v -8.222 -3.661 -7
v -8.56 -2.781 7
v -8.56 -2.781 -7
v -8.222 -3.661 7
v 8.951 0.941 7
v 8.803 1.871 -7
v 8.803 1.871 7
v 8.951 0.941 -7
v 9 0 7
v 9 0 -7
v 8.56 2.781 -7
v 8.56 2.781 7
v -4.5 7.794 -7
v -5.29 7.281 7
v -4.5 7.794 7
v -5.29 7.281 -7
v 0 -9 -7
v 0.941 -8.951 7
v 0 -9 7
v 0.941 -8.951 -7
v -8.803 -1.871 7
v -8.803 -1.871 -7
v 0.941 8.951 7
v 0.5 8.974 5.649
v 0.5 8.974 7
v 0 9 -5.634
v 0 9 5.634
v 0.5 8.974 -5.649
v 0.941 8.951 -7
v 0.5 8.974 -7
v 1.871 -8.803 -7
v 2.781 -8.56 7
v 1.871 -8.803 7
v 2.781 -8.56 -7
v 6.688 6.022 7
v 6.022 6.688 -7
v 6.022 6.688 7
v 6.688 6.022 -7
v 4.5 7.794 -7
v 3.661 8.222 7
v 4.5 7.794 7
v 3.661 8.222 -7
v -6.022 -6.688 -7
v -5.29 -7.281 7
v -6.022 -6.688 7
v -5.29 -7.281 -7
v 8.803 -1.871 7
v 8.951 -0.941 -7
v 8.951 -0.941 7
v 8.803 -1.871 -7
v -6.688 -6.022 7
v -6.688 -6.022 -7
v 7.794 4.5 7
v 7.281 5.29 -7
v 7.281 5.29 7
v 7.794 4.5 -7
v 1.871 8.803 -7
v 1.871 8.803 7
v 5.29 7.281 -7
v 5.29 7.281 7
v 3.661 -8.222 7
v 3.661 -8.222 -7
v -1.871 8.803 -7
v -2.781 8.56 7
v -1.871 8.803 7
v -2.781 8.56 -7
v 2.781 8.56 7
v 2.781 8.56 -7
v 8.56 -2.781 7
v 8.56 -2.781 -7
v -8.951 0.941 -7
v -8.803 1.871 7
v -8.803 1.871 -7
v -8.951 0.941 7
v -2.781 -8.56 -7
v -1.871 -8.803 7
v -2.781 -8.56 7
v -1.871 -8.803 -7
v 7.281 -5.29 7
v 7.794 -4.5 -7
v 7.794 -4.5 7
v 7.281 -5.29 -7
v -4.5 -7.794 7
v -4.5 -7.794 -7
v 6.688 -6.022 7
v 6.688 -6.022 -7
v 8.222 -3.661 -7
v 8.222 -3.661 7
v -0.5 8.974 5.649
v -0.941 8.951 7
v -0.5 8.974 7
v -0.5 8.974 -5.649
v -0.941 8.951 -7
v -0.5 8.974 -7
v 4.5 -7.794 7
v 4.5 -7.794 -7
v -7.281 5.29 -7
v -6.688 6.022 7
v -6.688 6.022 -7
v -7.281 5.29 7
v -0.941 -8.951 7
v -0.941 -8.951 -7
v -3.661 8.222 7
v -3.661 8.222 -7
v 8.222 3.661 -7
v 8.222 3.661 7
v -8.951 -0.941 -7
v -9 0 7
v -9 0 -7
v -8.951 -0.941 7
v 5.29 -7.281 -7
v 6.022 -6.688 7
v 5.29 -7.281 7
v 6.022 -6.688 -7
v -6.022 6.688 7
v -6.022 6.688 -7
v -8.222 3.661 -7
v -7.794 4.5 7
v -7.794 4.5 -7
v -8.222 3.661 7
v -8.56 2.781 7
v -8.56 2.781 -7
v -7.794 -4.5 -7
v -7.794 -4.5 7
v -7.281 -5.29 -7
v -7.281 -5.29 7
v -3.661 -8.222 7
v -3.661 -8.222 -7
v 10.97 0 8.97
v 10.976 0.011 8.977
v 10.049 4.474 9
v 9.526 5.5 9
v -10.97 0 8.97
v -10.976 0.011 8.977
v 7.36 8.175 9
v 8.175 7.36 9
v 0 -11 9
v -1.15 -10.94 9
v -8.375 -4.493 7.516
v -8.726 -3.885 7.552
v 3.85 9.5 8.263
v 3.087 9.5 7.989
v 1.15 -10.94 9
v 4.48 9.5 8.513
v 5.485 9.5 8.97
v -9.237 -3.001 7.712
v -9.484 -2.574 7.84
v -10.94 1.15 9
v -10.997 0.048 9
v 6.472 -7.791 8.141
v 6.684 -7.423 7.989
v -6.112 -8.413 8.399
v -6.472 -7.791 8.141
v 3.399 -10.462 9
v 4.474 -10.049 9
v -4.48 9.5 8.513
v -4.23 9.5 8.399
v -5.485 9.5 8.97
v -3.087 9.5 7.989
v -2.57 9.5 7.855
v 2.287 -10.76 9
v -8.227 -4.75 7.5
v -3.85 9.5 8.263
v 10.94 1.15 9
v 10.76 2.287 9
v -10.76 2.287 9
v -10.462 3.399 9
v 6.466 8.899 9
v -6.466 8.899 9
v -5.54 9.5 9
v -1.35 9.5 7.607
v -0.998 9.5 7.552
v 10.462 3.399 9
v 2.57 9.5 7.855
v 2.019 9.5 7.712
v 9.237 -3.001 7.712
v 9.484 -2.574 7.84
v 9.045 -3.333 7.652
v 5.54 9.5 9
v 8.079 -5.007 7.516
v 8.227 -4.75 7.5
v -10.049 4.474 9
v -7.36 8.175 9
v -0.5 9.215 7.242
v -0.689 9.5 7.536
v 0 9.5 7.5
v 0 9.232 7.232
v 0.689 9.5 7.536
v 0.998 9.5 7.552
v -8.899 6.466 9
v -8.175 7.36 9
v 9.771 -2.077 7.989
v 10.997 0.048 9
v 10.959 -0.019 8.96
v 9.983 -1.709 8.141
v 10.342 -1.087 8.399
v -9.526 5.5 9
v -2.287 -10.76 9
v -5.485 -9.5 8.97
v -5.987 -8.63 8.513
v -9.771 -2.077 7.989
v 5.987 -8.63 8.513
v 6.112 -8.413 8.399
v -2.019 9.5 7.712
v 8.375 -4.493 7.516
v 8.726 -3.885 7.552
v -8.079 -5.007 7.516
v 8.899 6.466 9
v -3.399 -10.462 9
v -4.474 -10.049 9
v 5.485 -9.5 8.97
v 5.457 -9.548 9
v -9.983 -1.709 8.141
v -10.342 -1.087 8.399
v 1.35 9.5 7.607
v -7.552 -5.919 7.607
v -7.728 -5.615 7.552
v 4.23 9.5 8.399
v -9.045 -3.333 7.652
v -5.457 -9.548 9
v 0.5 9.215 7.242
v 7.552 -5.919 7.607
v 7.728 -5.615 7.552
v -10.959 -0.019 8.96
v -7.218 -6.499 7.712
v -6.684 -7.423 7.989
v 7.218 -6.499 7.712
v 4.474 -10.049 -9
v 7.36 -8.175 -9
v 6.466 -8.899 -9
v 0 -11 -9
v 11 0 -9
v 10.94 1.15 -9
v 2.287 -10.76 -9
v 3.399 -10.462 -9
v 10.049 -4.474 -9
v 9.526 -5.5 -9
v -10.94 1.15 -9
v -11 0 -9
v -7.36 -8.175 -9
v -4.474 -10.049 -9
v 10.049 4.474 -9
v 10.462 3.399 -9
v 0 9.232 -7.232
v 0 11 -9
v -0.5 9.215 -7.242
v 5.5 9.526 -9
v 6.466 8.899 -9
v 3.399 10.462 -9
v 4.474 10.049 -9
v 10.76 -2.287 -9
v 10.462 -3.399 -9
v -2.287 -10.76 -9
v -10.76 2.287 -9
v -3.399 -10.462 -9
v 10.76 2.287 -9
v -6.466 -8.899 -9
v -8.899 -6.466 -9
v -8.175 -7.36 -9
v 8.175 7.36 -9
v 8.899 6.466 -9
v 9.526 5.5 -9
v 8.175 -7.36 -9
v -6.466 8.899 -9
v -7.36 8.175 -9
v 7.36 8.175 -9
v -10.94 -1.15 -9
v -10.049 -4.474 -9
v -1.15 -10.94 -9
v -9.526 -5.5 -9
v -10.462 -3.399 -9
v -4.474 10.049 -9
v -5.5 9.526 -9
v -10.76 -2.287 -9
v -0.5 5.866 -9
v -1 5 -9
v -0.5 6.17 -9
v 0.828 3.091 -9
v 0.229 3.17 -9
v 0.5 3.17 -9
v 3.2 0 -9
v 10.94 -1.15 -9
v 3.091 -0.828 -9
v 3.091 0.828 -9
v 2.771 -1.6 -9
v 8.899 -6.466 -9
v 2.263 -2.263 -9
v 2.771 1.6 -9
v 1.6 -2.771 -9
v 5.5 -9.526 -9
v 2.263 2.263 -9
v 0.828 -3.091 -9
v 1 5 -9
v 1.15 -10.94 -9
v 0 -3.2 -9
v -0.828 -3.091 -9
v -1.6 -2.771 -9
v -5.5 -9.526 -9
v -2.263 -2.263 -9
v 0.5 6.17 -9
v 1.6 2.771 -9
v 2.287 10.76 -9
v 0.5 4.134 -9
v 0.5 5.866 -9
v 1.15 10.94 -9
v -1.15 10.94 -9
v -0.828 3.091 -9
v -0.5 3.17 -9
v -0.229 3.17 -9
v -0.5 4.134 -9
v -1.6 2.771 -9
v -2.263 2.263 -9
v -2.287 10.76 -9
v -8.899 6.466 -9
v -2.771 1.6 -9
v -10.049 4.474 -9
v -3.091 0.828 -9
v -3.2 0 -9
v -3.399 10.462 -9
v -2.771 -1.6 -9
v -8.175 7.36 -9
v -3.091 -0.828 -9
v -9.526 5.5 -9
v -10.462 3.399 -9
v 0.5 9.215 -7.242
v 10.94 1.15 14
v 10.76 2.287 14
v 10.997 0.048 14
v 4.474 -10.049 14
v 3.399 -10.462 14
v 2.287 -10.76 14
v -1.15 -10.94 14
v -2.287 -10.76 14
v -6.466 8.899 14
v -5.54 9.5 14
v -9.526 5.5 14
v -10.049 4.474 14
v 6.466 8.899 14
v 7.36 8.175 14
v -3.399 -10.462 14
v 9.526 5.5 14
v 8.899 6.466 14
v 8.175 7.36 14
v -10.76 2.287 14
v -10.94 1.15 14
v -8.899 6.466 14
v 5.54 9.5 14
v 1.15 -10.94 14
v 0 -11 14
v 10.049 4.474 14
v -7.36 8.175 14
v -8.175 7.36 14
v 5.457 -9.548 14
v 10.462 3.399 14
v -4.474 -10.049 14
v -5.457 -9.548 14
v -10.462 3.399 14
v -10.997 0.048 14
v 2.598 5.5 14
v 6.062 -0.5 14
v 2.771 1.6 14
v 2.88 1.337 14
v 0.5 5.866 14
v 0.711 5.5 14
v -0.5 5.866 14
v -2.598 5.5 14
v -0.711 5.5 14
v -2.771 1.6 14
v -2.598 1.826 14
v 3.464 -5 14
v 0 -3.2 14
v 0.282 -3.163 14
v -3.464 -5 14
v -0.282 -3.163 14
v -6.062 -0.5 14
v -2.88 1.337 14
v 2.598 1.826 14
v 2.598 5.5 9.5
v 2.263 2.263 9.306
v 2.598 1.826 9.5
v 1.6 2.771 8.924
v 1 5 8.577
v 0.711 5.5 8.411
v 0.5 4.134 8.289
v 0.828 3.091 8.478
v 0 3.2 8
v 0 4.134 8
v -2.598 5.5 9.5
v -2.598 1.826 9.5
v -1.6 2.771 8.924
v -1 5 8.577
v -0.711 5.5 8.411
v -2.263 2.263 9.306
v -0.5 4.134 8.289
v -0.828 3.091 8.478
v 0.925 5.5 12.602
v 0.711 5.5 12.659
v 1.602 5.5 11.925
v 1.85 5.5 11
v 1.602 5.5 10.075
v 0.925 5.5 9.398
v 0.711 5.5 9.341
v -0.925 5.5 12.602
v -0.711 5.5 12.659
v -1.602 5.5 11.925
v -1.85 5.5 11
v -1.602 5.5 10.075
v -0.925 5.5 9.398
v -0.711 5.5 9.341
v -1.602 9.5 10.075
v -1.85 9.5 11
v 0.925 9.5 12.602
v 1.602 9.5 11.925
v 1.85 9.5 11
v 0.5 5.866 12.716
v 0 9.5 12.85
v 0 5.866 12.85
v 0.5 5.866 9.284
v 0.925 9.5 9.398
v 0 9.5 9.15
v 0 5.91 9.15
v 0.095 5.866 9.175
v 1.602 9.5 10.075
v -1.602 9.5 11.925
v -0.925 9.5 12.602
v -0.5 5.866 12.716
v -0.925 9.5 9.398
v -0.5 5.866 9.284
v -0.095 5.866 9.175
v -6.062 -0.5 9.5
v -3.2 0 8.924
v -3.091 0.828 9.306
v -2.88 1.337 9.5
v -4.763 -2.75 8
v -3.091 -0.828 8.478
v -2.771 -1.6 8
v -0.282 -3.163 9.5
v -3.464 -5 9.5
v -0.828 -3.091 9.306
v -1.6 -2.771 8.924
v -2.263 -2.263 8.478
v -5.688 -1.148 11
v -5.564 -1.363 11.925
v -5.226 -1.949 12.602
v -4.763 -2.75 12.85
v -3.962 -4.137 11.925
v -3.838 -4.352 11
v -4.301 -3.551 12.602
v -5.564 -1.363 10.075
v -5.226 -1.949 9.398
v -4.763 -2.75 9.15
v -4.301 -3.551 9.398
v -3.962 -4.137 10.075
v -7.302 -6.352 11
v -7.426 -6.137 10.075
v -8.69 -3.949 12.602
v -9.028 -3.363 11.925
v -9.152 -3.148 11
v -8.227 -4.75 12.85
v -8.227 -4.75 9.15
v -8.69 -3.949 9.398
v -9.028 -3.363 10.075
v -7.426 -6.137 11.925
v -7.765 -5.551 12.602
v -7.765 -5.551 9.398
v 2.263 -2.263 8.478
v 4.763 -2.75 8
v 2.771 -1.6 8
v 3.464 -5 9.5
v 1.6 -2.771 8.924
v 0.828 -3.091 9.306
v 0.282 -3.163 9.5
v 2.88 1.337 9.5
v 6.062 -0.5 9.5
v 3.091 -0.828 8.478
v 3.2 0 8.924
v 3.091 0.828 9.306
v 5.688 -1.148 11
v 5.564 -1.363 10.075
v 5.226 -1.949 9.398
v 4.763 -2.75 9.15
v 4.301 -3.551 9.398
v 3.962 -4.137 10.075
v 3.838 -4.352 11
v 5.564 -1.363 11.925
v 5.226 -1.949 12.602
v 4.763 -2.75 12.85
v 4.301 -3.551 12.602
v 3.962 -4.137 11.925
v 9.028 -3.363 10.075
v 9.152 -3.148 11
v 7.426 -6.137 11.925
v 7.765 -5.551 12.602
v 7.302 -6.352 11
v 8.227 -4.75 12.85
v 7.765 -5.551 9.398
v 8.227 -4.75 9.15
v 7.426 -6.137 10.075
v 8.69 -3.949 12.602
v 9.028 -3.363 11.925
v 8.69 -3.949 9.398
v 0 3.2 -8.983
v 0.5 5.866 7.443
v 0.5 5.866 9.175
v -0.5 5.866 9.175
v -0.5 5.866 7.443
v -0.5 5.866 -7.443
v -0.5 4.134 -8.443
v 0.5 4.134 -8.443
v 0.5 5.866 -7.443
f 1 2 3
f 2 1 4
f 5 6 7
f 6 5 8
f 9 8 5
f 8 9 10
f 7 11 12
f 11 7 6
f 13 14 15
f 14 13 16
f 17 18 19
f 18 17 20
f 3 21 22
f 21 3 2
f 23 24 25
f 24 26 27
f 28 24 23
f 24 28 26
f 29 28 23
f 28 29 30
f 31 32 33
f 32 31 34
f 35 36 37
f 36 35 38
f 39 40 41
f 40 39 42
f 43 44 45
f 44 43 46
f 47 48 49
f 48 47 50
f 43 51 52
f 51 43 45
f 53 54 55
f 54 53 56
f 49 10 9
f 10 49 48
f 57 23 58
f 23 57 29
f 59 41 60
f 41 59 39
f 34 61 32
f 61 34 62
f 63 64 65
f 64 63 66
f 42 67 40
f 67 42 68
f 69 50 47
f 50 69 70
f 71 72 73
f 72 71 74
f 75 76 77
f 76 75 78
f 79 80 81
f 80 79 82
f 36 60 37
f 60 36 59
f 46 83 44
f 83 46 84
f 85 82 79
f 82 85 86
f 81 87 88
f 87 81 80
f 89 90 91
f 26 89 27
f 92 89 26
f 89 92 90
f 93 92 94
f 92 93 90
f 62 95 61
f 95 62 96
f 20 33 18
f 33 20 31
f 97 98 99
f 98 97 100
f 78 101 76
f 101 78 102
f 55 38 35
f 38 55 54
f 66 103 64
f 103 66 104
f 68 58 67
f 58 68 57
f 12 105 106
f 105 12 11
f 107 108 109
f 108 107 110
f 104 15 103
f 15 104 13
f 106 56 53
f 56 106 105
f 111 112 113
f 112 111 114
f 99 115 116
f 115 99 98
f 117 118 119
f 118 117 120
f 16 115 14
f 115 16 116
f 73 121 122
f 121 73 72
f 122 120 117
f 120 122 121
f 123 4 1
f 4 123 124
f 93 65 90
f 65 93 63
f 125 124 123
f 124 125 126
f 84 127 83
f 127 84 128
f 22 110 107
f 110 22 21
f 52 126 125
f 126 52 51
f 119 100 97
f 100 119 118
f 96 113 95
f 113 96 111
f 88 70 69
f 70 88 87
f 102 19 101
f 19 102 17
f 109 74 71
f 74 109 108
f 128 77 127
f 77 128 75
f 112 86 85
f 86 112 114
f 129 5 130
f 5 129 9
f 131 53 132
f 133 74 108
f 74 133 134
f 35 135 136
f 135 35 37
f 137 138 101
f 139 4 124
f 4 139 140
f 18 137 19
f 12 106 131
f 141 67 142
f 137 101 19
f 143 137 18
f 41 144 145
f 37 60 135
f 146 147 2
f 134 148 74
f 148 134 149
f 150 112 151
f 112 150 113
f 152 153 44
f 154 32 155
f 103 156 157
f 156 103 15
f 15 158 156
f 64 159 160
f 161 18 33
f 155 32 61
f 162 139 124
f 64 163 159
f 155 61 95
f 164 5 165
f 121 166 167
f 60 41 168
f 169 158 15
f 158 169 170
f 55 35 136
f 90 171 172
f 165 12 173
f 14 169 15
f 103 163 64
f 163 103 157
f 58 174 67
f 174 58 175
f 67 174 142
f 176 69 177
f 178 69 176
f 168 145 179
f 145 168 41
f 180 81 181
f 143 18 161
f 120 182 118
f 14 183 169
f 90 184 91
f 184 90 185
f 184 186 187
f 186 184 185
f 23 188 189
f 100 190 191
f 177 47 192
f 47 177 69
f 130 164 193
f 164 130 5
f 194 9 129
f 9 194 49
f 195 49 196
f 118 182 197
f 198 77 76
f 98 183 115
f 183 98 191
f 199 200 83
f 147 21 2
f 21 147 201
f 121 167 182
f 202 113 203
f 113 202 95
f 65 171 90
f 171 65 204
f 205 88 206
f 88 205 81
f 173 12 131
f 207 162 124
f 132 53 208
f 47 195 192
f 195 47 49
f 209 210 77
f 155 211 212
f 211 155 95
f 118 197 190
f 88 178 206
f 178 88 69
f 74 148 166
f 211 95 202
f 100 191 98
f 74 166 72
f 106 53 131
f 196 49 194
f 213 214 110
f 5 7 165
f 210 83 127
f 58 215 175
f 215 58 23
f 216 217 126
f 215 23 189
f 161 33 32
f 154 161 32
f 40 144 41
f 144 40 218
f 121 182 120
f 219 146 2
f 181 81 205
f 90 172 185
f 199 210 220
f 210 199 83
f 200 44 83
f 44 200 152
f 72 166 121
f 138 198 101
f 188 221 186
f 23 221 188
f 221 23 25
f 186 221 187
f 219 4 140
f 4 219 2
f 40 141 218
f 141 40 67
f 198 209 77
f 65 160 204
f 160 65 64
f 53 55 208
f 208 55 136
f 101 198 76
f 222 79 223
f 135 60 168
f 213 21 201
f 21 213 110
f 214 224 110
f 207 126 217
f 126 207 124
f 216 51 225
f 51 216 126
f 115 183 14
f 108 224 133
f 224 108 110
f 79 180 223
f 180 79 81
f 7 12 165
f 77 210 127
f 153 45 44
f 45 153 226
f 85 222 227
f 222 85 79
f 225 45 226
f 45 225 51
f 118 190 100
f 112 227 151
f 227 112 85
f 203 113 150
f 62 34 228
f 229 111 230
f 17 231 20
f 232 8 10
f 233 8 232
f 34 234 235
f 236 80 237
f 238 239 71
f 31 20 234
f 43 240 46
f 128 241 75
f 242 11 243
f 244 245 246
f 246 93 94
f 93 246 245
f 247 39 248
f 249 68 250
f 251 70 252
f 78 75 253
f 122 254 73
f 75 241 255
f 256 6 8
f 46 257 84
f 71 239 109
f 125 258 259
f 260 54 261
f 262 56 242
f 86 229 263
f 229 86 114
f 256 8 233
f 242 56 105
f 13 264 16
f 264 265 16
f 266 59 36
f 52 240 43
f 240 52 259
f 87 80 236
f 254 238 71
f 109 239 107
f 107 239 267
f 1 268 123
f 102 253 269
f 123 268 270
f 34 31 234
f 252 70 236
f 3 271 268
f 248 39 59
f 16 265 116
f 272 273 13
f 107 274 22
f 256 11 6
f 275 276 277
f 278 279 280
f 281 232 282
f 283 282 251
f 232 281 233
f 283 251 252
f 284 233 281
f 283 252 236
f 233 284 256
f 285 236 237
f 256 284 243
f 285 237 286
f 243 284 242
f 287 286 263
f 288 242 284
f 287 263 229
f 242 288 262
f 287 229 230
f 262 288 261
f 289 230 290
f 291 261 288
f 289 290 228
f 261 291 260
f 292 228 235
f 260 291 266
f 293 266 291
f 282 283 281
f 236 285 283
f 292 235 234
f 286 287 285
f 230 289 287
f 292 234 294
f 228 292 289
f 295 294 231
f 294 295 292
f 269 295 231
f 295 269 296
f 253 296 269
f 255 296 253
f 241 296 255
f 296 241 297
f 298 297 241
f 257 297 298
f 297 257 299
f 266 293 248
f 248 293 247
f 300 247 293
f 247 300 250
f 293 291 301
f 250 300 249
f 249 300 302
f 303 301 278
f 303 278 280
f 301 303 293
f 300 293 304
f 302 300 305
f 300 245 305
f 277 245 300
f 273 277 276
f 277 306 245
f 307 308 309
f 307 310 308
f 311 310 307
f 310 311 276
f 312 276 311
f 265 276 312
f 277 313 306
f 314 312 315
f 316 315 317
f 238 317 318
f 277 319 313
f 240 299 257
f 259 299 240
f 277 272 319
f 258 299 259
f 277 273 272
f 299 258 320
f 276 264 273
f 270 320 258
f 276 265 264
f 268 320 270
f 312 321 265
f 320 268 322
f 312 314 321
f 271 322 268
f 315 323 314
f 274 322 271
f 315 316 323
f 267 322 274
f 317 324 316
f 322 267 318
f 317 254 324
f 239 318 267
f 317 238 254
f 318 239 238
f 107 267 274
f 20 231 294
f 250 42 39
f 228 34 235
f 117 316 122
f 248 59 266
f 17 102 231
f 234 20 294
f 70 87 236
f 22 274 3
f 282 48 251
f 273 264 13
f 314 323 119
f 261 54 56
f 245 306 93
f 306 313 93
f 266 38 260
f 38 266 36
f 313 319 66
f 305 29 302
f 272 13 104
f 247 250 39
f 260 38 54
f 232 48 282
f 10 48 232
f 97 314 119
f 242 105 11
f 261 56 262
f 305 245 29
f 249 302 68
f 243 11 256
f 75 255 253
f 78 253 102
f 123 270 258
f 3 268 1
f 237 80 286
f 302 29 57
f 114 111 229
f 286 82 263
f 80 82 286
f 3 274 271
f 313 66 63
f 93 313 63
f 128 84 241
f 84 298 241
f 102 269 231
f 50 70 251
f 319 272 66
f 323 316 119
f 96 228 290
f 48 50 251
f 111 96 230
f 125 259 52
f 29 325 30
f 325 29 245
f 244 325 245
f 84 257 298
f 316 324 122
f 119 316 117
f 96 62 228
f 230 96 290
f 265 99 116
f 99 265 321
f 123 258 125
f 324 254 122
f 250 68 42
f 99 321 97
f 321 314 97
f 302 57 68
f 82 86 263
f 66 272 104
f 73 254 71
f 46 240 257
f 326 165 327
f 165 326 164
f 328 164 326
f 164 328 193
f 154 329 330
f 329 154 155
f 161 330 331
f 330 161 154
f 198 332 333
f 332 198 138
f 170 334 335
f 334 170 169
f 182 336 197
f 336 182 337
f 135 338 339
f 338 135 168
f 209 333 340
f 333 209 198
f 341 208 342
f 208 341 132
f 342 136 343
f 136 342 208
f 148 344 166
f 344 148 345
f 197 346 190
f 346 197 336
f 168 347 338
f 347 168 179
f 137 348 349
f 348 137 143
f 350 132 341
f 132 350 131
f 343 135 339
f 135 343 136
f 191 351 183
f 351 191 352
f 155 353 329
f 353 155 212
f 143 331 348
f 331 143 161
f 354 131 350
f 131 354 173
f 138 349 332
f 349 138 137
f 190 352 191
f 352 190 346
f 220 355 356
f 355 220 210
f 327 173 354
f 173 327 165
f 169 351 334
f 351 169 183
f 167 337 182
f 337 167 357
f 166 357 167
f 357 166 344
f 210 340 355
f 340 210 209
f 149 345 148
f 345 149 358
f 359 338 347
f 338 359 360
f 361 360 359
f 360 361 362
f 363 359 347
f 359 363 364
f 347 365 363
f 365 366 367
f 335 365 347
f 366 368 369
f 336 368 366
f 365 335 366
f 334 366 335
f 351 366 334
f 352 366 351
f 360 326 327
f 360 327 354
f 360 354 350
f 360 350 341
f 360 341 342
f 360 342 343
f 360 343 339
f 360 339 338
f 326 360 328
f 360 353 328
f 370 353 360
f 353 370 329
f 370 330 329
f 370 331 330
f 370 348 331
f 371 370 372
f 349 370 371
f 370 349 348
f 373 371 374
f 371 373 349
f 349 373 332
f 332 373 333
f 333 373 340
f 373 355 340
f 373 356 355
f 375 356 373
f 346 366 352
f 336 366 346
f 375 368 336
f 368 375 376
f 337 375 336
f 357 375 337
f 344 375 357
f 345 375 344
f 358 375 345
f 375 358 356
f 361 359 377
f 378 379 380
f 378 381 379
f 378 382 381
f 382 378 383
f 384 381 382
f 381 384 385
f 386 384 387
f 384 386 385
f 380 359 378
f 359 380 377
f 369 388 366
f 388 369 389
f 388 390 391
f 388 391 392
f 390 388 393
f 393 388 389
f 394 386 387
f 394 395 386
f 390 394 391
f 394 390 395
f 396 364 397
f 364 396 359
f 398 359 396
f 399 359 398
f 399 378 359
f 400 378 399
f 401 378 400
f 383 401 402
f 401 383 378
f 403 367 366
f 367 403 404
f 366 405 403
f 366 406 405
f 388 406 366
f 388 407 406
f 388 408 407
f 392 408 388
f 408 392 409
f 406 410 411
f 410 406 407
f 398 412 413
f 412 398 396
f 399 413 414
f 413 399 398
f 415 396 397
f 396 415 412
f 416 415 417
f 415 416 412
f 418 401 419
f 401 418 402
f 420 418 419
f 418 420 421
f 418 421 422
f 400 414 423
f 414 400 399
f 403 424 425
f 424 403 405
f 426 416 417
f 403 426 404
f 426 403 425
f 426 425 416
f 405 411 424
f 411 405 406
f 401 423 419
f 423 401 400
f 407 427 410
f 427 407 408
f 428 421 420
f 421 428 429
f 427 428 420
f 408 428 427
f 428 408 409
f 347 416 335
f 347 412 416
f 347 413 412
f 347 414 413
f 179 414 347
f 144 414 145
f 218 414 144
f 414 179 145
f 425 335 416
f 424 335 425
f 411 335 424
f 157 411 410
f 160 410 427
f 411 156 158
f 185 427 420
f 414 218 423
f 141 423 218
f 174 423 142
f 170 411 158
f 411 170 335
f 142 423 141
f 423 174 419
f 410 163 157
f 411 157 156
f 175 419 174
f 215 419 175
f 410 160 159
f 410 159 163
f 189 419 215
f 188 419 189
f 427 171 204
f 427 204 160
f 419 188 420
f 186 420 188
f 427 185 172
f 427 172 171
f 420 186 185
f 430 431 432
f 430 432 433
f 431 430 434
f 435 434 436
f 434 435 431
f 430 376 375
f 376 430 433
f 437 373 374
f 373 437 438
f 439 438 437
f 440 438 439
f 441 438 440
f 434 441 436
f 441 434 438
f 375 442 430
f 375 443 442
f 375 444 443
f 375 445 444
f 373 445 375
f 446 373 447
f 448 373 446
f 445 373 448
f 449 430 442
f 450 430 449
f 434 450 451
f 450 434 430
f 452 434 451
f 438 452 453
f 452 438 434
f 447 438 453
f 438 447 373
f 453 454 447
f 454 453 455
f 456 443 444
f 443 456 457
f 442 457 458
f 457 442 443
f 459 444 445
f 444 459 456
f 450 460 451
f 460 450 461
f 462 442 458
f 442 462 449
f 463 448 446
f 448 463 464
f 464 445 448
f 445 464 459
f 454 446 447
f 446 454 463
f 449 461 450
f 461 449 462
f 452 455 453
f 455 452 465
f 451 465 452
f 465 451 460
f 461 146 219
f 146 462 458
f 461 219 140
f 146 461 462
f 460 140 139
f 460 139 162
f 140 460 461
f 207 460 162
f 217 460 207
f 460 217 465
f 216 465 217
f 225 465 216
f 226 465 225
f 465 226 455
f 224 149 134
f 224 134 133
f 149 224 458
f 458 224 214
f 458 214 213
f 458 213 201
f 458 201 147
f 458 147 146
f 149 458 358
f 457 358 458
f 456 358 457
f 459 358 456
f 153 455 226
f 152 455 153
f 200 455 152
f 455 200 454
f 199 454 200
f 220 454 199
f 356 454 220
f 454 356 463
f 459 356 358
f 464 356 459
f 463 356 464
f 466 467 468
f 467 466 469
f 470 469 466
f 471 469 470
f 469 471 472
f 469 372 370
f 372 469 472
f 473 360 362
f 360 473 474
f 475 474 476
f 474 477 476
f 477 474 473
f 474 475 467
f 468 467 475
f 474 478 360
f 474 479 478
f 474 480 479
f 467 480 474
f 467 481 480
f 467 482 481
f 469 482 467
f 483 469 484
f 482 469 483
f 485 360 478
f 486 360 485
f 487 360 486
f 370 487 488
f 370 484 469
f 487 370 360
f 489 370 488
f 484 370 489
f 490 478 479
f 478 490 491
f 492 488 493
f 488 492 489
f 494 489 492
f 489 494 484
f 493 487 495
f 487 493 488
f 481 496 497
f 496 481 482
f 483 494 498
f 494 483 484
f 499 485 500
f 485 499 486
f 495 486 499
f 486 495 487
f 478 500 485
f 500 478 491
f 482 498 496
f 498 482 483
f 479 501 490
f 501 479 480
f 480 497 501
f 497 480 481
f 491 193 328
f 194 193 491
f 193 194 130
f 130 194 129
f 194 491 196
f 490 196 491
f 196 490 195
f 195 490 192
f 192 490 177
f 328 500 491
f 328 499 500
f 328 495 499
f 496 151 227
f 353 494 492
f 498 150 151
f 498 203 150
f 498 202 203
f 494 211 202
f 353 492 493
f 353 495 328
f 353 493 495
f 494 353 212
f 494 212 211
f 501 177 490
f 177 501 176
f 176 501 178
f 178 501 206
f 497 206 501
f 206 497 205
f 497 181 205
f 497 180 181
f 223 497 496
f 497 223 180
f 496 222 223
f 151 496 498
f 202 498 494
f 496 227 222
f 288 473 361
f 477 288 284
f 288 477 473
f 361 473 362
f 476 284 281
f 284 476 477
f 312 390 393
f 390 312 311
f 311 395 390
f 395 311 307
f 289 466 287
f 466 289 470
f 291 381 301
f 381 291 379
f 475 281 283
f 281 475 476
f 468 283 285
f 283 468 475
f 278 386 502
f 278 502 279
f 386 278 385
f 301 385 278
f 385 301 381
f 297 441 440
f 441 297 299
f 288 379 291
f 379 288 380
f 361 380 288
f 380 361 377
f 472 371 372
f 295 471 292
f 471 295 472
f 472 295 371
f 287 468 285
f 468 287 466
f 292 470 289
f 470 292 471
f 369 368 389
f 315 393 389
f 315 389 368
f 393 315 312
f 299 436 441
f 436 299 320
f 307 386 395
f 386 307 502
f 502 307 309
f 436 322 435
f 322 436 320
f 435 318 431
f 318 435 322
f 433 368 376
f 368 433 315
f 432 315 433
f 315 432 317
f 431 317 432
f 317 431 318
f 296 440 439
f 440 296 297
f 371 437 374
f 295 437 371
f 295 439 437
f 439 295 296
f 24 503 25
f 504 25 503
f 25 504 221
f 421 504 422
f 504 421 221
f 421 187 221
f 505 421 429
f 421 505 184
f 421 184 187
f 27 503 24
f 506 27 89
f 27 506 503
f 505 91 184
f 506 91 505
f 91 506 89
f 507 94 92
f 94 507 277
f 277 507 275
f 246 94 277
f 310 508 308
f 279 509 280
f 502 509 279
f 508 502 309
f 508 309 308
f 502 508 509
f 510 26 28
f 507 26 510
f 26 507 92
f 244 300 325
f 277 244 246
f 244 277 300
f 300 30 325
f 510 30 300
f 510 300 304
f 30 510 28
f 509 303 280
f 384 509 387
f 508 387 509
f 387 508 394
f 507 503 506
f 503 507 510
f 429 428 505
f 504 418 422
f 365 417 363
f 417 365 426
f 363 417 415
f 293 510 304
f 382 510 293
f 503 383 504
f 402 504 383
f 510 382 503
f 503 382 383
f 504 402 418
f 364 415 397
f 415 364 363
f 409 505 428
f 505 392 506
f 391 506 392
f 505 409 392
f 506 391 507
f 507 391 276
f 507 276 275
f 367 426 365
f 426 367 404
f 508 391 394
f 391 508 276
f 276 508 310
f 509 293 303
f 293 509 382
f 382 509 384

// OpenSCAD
// file: configuration.scad
//Configuration File
//Lets you adjust pretty much everything
//
//Makes it all super paramatric
//


//Configuration Block
$fn = 20;
module configBlock(){
	difference(){
		cube([15,30,10],center=true);

		union(){  //Vertical Holes
			translate([0,10,5]) rotate([0,0,0]) cylinder(r=M3/2,h=10,center=true);
			translate([0,3,5]) rotate([0,0,0]) cylinder(r=M4/2,h=10,center=true);
			translate([0,-8,5]) rotate([0,0,0]) cylinder(r=M8/2,h=10,center=true);
		}

		union(){  //Horizontal Holes
			translate([-7.5,10,0]) rotate([0,90,0]) cylinder(r=M3h/2,h=10,center=true);		
			translate([-7.5,3,0]) rotate([0,90,0]) cylinder(r=M4h/2,h=10,center=true);
			//stranslate([0,-8,0]) rotate([0,90,0]) cylinder(r=M8/2,h=10,center=true);
		}
	}
}

//Bolts
M3 = 4;
M4 = 5;
M8 = 9;

M3h = 3.7;  //Horizontal versions
M4h = 5;  //Horizontal versions
M8h = 8; //Horizontal versions

//Nuts
M3_nut = 0;
M4_nut = 0;

//Size of other parts
rod = 8;  //Dimension of smooth rod
lm8uu = 16;

/*************************
 Printer Design files now
**************************/

//basic
arm_length = 100 ; //Length of the arms based on a planned 100x100 print size
pole_center = 60 ; //The pole distance from the center of the print
rod_sep = 25 + rod/2; // pole to pole seperation for one set. Includes rod length
rod_height = 260;

//motor end effector


//Universal joints
holewidth = 6;
arm_sep = 40;



//Hotend
// main file
include <configuration.scad>;
motor_shaft_radius = 6.4/2;
m3_wide_radius = M3h/2;
m3_nut_radius = 6/2;

radius = 9;
width = 16;
top = 5;
smoothness = 60;

//for the center part

end_thick = 0;
middle_thick = 2;




module spool() {
	difference() {
		union() {
     		cylinder(r=radius, h=width, center=true, $fn=smoothness);
			//seperator();
			
			
			translate([0, 0, width/2]) cylinder(r1=radius, r2=radius+2, h=2, center=true, $fn=smoothness);
			translate([0, 0, -width/2]) cylinder(r2=radius, r1=radius+2, h=2, center=true, $fn=smoothness);
			translate([0, 0, width/2+top/2+1]) cylinder(r=radius+2, h=top, center=true, $fn=smoothness);
		}

    // Motor shaft.
		cylinder(r=motor_shaft_radius, h=50, center=true, $fn=24);

    // Filament tunnels.
		translate([0, radius, width/2-1.5]) rotate([-30, 0, 0])
			#cube([1, 2*radius, 1.5], center=true);
		translate([0, radius, -width/2+1.5]) rotate([30, 0, 0])
			#cube([1, 2*radius, 1.5], center=true);
		translate([0, 5, 0])
			#cylinder(r=1, h=40, center=true, $fn=6);

    // M3 screws and nuts on three sides.
		for (a = [0:120:359]) {
			rotate([0, 0, a]) translate([0, 4.5, width/2+3]) rotate([90, 0, 0]) {
				cylinder(r=m3_wide_radius, h=radius+5, center=true, $fn=12);
				translate([0, 0, 1-radius]) cylinder(r=7, h=6, center=true);
				for (z = [0:10]) {
					translate([0, z, 1.5]) rotate([0, 0, 30])
						cylinder(r=m3_nut_radius, h=5, center=true, $fn=6);
				}
			}
		}
	}
}




translate([0, 0, 0]) spool();
